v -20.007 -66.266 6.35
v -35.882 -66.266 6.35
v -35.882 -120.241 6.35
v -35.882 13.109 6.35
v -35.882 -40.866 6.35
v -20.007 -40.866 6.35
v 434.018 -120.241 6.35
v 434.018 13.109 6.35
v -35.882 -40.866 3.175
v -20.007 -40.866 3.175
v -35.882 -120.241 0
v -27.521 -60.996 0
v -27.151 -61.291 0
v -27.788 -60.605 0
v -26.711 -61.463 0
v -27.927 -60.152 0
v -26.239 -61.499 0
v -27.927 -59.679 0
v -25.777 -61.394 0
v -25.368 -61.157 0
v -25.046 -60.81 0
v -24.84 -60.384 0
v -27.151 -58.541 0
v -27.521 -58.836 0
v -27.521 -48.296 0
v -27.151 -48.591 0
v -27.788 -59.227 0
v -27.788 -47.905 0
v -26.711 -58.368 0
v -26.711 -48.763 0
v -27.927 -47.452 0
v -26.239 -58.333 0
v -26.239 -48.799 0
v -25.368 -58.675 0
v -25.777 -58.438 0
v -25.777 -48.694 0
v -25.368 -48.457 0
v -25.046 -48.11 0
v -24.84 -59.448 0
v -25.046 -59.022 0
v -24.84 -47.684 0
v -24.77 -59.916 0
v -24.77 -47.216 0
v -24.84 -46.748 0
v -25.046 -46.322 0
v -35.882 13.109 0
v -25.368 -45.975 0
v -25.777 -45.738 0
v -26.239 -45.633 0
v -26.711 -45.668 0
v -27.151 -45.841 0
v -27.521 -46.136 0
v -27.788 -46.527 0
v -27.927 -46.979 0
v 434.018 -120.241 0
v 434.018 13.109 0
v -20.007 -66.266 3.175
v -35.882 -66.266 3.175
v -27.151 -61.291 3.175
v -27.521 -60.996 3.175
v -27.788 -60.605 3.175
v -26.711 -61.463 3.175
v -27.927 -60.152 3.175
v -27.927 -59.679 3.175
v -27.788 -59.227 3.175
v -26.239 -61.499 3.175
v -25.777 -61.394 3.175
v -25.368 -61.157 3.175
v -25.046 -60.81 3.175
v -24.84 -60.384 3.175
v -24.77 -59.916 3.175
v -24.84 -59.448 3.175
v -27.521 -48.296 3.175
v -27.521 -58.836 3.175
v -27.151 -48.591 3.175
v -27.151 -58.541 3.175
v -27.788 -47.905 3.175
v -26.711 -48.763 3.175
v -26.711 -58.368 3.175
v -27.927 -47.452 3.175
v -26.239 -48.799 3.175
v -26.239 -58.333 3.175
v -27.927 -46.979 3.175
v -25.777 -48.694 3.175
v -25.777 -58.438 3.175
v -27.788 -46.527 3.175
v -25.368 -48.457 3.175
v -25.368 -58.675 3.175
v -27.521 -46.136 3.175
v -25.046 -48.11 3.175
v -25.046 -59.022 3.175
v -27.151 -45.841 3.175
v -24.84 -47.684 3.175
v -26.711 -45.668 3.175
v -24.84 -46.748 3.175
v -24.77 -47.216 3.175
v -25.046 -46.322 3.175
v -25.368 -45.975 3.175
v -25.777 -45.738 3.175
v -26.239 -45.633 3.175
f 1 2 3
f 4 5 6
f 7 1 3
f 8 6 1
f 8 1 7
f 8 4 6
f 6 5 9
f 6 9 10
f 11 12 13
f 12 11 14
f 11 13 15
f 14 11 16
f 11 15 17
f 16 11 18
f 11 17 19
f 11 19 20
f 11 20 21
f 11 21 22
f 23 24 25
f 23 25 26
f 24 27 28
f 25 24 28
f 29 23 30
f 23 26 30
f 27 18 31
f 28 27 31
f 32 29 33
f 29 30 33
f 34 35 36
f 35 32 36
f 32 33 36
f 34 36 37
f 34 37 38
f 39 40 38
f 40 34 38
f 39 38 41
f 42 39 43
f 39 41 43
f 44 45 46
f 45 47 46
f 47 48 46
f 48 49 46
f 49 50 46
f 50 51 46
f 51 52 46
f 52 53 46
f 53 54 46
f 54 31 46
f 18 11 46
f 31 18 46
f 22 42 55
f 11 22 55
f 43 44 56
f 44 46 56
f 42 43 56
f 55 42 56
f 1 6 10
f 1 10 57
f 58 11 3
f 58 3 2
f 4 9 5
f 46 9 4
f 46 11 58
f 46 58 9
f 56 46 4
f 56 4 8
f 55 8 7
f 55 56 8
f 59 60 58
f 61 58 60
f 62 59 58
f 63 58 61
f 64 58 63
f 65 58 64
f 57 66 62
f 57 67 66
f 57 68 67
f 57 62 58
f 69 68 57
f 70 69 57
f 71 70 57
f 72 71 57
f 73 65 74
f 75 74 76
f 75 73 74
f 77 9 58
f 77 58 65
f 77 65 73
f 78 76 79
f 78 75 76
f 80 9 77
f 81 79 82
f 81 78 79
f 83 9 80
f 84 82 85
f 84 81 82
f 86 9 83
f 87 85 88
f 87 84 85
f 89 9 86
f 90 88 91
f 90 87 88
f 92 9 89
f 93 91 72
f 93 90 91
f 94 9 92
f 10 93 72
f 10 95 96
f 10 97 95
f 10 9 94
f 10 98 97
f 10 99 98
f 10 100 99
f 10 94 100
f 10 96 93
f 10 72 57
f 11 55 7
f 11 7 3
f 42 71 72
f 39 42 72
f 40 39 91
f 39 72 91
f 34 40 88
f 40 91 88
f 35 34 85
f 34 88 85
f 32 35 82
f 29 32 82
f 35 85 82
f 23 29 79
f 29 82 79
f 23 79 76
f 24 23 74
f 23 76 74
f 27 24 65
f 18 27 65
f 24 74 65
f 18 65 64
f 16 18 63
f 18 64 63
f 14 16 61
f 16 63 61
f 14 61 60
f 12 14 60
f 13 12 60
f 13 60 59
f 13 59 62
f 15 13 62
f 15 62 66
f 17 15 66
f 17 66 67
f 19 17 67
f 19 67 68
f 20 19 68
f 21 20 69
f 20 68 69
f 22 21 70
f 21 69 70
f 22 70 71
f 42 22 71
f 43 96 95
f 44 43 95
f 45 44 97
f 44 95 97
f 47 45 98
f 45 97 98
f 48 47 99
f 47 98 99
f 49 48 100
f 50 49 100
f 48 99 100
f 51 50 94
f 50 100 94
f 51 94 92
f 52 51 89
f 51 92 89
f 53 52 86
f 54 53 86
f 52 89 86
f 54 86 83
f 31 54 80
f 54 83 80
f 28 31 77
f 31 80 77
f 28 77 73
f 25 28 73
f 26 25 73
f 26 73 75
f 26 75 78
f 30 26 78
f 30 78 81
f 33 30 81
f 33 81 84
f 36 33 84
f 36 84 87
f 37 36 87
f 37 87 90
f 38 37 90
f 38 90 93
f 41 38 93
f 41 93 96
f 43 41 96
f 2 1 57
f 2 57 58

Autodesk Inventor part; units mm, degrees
ref_plane "YZ Plane" through (0, 0, 0) normal (1, 0, 0) x (0, 1, 0)
ref_plane "XZ Plane" through (0, 0, 0) normal (0, 1, 0) x (-1, 0, 0)
ref_plane "XY Plane" through (0, 0, 0) normal (0, 0, 1) x (1, 0, 0)
sketch "Sketch1" plane through (0, 0, 0) normal (0, 0, 1) x (1, 0, 0)
  line L0 (-35.8824, 13.1092) -> (434.0176, 13.1092)
  line L1 (434.0176, 13.1092) -> (434.0176, -120.2408)
  line L2 (434.0176, -120.2408) -> (-35.8824, -120.2408)
  line L3 (-35.8824, -120.2408) -> (-35.8824, 13.1092)
  point P0 (0, 0)
  dimension "d0" = 469.9
  dimension "d1" = 133.35
extrude "Extrusion1" add sketch "Sketch1" along normal blind 6.35
sketch "Sketch2" plane through (0, 0, 6.35) normal (0, 0, 1) x (1, 0, 0)
  line L0 (434.0176, 13.1092) -> (434.0176, -120.2408) projected
  line L1 (434.0176, -40.8658) -> (418.1426, -40.8658)
  line L2 (418.1426, -40.8658) -> (418.1426, -66.2658)
  line L3 (418.1426, -66.2658) -> (434.0176, -66.2658)
  line L4 (434.0176, -66.2658) -> (434.0176, -40.8658)
  line L5 (-35.8824, 13.1092) -> (434.0176, 13.1092) projected
  line L6 (-35.8824, -120.2408) -> (-35.8824, 13.1092) projected
  line L7 (434.0176, -120.2408) -> (-35.8824, -120.2408) projected
  line L8 (199.0676, 13.1092) -> (199.0676, -120.2408)
  line L9 (-35.8824, -40.8658) -> (-20.0074, -40.8658)
  line L10 (-20.0074, -40.8658) -> (-20.0074, -66.2658)
  line L11 (-20.0074, -66.2658) -> (-35.8824, -66.2658)
  line L12 (-35.8824, -66.2658) -> (-35.8824, -40.8658)
  point P0 (0, 0)
  dimension "d4" = 15.875
  dimension "d5" = 25.4
  dimension "d6" = 53.975
  dimension "d16" = 234.95
ref_plane "Work Plane1" through (0, 0, 3.175) normal (0, 0, 1) x (1, 0, 0)
extrude "Extrusion4" cut sketch "Sketch2" against normal blind 3.175 contours L9 L10 L11 L6
sketch "Sketch4" plane through (0, 0, 3.175) normal (0, 0, 1) x (1, 0, 0)
  line L0 (-20.0074, -66.2658) -> (-20.0074, -40.8658) projected
  line L1 (-20.0074, -40.8658) -> (-35.8824, -40.8658) projected
  circle A0 centre (-26.3574, -47.2158) radius 1.5875
  circle A1 centre (-26.3574, -59.9158) radius 1.5875
  point P0 (0, 0)
  dimension "d19" = 12.7
  dimension "d20" = 6.35
  dimension "d21" = 3.175
  dimension "d22" = 3.175
  dimension "d23" = 6.35
extrude "Extrusion5" cut sketch "Sketch4" against normal blind 3.175
properties part number "top panel for hinge 2"
